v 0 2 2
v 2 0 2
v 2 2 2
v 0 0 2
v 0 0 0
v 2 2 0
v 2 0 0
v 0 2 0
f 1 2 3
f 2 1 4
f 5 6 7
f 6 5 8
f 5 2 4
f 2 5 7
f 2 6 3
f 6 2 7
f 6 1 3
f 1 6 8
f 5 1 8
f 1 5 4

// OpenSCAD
echo(len([for(i=[0:999998]) i]));
echo([1, for(i=[0:999999]) i, 2]);
echo([1, each [0:999999], 2]);
echo(len([for (i=[0:999], j=[0:1000]) 0]));
echo(len([for (i=0; i<1; i=i+1) each [0:999999]]));
for (i = [0:9999]) cube();
for (i = [0:9998]) if (i == 9998) cube(2);
for (i = [0:1], j = [0:9999]) sphere();
intersection_for (i = [0:9999]) cube();
for () cube();
echo([for () 1]);
for (c = "ab") echo(c);
for (b = false) echo(b);
